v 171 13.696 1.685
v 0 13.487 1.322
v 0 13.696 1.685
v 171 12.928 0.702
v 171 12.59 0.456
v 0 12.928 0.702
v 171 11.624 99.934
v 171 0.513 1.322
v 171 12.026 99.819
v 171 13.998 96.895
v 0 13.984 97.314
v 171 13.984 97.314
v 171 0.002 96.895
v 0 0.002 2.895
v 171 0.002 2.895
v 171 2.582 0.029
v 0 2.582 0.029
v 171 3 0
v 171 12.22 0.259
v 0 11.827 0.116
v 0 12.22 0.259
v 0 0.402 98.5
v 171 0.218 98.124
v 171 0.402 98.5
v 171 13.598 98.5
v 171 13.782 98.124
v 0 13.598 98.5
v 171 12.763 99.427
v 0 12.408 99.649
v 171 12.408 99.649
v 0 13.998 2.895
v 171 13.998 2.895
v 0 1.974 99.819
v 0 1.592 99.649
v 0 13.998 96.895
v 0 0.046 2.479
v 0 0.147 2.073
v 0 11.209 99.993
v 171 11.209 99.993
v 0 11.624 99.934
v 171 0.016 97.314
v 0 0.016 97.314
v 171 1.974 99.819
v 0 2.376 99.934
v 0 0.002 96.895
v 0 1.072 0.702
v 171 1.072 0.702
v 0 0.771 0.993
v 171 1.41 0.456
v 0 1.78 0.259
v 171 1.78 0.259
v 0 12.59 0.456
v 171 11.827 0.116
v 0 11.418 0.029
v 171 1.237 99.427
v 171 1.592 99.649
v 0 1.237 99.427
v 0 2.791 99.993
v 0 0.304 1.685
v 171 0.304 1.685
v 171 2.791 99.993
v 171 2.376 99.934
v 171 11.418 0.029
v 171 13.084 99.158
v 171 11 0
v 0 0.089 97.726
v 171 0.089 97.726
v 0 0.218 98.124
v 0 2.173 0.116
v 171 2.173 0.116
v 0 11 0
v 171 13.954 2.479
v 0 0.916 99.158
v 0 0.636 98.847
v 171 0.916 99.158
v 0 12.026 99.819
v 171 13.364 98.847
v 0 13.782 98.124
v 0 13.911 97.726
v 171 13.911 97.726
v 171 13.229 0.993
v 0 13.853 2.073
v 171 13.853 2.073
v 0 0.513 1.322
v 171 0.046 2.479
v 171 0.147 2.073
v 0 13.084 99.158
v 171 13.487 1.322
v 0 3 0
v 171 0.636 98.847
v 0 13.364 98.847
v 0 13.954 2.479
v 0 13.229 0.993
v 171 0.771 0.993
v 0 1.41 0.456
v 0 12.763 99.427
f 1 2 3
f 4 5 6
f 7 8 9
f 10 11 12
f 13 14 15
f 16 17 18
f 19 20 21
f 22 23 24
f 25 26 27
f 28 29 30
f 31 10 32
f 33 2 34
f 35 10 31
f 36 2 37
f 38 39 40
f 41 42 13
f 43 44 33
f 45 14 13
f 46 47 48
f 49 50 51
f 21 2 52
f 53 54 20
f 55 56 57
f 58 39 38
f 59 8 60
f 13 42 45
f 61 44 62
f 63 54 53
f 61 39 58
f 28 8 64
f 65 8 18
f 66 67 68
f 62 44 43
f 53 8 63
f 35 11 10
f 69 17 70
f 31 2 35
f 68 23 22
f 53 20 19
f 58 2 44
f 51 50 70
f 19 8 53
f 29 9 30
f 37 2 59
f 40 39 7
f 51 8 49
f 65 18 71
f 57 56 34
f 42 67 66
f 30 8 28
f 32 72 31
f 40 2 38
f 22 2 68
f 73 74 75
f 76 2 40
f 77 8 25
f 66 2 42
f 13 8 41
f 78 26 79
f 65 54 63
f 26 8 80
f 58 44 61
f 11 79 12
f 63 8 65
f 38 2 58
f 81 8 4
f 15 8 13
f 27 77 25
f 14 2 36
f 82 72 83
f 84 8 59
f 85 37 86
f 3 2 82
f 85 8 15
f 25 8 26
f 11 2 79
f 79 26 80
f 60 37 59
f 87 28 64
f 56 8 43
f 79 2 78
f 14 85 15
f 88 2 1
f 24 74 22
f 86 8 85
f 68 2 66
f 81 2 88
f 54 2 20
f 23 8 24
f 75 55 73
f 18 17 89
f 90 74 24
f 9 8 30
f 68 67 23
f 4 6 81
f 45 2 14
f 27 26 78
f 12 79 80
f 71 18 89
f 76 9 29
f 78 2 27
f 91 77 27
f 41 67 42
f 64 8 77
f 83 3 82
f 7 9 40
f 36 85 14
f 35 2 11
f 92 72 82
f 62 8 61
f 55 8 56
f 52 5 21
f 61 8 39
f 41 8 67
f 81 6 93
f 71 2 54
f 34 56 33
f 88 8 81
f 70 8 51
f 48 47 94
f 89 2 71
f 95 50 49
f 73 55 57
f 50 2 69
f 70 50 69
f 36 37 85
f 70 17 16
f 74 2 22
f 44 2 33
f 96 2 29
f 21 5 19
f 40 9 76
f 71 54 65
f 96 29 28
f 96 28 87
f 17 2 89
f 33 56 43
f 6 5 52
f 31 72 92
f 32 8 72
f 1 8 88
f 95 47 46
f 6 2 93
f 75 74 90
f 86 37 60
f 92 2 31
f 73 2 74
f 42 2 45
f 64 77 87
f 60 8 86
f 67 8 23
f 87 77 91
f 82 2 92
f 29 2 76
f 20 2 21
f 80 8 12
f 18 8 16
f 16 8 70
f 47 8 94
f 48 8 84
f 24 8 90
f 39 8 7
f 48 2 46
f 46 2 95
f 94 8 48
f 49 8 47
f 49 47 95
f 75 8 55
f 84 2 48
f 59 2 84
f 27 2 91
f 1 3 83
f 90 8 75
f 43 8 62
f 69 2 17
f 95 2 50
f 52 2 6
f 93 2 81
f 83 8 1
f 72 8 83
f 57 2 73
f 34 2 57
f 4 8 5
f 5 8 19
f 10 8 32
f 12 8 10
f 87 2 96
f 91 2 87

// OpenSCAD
// file: const.scad
SWITCH_WIDTH = 171;
SWITCH_DEPTH = 14;
SWITCH_HEIGHT = 100;

DOCK_SLIT_WIDTH = 8;
DOCK_SLIT_DEPTH = 2;
DOCK_SLIT_HEIGHT = 12;

BACK_HOLE_WIDTH = 42;
BACK_HOLE_HEIGHT = 5;
HOLE_VERTICAL_POSITION = DOCK_SLIT_HEIGHT - BACK_HOLE_HEIGHT;
HOLE_DISTANCE_FROM_CENTER = 4 + DOCK_SLIT_WIDTH / 2;
// main file
include <./const.scad>

switch();

module switch() {

  r = 3;
  h = 1;

  translate([ 0, r, r ])
  minkowski() {

    cube([ SWITCH_WIDTH - h, SWITCH_DEPTH - (r * 2), SWITCH_HEIGHT - (r * 2) ]);

    $fn = 45;
    rotate([ 0, 90, 0 ])
    cylinder(r = r, h = h);
  }

}
